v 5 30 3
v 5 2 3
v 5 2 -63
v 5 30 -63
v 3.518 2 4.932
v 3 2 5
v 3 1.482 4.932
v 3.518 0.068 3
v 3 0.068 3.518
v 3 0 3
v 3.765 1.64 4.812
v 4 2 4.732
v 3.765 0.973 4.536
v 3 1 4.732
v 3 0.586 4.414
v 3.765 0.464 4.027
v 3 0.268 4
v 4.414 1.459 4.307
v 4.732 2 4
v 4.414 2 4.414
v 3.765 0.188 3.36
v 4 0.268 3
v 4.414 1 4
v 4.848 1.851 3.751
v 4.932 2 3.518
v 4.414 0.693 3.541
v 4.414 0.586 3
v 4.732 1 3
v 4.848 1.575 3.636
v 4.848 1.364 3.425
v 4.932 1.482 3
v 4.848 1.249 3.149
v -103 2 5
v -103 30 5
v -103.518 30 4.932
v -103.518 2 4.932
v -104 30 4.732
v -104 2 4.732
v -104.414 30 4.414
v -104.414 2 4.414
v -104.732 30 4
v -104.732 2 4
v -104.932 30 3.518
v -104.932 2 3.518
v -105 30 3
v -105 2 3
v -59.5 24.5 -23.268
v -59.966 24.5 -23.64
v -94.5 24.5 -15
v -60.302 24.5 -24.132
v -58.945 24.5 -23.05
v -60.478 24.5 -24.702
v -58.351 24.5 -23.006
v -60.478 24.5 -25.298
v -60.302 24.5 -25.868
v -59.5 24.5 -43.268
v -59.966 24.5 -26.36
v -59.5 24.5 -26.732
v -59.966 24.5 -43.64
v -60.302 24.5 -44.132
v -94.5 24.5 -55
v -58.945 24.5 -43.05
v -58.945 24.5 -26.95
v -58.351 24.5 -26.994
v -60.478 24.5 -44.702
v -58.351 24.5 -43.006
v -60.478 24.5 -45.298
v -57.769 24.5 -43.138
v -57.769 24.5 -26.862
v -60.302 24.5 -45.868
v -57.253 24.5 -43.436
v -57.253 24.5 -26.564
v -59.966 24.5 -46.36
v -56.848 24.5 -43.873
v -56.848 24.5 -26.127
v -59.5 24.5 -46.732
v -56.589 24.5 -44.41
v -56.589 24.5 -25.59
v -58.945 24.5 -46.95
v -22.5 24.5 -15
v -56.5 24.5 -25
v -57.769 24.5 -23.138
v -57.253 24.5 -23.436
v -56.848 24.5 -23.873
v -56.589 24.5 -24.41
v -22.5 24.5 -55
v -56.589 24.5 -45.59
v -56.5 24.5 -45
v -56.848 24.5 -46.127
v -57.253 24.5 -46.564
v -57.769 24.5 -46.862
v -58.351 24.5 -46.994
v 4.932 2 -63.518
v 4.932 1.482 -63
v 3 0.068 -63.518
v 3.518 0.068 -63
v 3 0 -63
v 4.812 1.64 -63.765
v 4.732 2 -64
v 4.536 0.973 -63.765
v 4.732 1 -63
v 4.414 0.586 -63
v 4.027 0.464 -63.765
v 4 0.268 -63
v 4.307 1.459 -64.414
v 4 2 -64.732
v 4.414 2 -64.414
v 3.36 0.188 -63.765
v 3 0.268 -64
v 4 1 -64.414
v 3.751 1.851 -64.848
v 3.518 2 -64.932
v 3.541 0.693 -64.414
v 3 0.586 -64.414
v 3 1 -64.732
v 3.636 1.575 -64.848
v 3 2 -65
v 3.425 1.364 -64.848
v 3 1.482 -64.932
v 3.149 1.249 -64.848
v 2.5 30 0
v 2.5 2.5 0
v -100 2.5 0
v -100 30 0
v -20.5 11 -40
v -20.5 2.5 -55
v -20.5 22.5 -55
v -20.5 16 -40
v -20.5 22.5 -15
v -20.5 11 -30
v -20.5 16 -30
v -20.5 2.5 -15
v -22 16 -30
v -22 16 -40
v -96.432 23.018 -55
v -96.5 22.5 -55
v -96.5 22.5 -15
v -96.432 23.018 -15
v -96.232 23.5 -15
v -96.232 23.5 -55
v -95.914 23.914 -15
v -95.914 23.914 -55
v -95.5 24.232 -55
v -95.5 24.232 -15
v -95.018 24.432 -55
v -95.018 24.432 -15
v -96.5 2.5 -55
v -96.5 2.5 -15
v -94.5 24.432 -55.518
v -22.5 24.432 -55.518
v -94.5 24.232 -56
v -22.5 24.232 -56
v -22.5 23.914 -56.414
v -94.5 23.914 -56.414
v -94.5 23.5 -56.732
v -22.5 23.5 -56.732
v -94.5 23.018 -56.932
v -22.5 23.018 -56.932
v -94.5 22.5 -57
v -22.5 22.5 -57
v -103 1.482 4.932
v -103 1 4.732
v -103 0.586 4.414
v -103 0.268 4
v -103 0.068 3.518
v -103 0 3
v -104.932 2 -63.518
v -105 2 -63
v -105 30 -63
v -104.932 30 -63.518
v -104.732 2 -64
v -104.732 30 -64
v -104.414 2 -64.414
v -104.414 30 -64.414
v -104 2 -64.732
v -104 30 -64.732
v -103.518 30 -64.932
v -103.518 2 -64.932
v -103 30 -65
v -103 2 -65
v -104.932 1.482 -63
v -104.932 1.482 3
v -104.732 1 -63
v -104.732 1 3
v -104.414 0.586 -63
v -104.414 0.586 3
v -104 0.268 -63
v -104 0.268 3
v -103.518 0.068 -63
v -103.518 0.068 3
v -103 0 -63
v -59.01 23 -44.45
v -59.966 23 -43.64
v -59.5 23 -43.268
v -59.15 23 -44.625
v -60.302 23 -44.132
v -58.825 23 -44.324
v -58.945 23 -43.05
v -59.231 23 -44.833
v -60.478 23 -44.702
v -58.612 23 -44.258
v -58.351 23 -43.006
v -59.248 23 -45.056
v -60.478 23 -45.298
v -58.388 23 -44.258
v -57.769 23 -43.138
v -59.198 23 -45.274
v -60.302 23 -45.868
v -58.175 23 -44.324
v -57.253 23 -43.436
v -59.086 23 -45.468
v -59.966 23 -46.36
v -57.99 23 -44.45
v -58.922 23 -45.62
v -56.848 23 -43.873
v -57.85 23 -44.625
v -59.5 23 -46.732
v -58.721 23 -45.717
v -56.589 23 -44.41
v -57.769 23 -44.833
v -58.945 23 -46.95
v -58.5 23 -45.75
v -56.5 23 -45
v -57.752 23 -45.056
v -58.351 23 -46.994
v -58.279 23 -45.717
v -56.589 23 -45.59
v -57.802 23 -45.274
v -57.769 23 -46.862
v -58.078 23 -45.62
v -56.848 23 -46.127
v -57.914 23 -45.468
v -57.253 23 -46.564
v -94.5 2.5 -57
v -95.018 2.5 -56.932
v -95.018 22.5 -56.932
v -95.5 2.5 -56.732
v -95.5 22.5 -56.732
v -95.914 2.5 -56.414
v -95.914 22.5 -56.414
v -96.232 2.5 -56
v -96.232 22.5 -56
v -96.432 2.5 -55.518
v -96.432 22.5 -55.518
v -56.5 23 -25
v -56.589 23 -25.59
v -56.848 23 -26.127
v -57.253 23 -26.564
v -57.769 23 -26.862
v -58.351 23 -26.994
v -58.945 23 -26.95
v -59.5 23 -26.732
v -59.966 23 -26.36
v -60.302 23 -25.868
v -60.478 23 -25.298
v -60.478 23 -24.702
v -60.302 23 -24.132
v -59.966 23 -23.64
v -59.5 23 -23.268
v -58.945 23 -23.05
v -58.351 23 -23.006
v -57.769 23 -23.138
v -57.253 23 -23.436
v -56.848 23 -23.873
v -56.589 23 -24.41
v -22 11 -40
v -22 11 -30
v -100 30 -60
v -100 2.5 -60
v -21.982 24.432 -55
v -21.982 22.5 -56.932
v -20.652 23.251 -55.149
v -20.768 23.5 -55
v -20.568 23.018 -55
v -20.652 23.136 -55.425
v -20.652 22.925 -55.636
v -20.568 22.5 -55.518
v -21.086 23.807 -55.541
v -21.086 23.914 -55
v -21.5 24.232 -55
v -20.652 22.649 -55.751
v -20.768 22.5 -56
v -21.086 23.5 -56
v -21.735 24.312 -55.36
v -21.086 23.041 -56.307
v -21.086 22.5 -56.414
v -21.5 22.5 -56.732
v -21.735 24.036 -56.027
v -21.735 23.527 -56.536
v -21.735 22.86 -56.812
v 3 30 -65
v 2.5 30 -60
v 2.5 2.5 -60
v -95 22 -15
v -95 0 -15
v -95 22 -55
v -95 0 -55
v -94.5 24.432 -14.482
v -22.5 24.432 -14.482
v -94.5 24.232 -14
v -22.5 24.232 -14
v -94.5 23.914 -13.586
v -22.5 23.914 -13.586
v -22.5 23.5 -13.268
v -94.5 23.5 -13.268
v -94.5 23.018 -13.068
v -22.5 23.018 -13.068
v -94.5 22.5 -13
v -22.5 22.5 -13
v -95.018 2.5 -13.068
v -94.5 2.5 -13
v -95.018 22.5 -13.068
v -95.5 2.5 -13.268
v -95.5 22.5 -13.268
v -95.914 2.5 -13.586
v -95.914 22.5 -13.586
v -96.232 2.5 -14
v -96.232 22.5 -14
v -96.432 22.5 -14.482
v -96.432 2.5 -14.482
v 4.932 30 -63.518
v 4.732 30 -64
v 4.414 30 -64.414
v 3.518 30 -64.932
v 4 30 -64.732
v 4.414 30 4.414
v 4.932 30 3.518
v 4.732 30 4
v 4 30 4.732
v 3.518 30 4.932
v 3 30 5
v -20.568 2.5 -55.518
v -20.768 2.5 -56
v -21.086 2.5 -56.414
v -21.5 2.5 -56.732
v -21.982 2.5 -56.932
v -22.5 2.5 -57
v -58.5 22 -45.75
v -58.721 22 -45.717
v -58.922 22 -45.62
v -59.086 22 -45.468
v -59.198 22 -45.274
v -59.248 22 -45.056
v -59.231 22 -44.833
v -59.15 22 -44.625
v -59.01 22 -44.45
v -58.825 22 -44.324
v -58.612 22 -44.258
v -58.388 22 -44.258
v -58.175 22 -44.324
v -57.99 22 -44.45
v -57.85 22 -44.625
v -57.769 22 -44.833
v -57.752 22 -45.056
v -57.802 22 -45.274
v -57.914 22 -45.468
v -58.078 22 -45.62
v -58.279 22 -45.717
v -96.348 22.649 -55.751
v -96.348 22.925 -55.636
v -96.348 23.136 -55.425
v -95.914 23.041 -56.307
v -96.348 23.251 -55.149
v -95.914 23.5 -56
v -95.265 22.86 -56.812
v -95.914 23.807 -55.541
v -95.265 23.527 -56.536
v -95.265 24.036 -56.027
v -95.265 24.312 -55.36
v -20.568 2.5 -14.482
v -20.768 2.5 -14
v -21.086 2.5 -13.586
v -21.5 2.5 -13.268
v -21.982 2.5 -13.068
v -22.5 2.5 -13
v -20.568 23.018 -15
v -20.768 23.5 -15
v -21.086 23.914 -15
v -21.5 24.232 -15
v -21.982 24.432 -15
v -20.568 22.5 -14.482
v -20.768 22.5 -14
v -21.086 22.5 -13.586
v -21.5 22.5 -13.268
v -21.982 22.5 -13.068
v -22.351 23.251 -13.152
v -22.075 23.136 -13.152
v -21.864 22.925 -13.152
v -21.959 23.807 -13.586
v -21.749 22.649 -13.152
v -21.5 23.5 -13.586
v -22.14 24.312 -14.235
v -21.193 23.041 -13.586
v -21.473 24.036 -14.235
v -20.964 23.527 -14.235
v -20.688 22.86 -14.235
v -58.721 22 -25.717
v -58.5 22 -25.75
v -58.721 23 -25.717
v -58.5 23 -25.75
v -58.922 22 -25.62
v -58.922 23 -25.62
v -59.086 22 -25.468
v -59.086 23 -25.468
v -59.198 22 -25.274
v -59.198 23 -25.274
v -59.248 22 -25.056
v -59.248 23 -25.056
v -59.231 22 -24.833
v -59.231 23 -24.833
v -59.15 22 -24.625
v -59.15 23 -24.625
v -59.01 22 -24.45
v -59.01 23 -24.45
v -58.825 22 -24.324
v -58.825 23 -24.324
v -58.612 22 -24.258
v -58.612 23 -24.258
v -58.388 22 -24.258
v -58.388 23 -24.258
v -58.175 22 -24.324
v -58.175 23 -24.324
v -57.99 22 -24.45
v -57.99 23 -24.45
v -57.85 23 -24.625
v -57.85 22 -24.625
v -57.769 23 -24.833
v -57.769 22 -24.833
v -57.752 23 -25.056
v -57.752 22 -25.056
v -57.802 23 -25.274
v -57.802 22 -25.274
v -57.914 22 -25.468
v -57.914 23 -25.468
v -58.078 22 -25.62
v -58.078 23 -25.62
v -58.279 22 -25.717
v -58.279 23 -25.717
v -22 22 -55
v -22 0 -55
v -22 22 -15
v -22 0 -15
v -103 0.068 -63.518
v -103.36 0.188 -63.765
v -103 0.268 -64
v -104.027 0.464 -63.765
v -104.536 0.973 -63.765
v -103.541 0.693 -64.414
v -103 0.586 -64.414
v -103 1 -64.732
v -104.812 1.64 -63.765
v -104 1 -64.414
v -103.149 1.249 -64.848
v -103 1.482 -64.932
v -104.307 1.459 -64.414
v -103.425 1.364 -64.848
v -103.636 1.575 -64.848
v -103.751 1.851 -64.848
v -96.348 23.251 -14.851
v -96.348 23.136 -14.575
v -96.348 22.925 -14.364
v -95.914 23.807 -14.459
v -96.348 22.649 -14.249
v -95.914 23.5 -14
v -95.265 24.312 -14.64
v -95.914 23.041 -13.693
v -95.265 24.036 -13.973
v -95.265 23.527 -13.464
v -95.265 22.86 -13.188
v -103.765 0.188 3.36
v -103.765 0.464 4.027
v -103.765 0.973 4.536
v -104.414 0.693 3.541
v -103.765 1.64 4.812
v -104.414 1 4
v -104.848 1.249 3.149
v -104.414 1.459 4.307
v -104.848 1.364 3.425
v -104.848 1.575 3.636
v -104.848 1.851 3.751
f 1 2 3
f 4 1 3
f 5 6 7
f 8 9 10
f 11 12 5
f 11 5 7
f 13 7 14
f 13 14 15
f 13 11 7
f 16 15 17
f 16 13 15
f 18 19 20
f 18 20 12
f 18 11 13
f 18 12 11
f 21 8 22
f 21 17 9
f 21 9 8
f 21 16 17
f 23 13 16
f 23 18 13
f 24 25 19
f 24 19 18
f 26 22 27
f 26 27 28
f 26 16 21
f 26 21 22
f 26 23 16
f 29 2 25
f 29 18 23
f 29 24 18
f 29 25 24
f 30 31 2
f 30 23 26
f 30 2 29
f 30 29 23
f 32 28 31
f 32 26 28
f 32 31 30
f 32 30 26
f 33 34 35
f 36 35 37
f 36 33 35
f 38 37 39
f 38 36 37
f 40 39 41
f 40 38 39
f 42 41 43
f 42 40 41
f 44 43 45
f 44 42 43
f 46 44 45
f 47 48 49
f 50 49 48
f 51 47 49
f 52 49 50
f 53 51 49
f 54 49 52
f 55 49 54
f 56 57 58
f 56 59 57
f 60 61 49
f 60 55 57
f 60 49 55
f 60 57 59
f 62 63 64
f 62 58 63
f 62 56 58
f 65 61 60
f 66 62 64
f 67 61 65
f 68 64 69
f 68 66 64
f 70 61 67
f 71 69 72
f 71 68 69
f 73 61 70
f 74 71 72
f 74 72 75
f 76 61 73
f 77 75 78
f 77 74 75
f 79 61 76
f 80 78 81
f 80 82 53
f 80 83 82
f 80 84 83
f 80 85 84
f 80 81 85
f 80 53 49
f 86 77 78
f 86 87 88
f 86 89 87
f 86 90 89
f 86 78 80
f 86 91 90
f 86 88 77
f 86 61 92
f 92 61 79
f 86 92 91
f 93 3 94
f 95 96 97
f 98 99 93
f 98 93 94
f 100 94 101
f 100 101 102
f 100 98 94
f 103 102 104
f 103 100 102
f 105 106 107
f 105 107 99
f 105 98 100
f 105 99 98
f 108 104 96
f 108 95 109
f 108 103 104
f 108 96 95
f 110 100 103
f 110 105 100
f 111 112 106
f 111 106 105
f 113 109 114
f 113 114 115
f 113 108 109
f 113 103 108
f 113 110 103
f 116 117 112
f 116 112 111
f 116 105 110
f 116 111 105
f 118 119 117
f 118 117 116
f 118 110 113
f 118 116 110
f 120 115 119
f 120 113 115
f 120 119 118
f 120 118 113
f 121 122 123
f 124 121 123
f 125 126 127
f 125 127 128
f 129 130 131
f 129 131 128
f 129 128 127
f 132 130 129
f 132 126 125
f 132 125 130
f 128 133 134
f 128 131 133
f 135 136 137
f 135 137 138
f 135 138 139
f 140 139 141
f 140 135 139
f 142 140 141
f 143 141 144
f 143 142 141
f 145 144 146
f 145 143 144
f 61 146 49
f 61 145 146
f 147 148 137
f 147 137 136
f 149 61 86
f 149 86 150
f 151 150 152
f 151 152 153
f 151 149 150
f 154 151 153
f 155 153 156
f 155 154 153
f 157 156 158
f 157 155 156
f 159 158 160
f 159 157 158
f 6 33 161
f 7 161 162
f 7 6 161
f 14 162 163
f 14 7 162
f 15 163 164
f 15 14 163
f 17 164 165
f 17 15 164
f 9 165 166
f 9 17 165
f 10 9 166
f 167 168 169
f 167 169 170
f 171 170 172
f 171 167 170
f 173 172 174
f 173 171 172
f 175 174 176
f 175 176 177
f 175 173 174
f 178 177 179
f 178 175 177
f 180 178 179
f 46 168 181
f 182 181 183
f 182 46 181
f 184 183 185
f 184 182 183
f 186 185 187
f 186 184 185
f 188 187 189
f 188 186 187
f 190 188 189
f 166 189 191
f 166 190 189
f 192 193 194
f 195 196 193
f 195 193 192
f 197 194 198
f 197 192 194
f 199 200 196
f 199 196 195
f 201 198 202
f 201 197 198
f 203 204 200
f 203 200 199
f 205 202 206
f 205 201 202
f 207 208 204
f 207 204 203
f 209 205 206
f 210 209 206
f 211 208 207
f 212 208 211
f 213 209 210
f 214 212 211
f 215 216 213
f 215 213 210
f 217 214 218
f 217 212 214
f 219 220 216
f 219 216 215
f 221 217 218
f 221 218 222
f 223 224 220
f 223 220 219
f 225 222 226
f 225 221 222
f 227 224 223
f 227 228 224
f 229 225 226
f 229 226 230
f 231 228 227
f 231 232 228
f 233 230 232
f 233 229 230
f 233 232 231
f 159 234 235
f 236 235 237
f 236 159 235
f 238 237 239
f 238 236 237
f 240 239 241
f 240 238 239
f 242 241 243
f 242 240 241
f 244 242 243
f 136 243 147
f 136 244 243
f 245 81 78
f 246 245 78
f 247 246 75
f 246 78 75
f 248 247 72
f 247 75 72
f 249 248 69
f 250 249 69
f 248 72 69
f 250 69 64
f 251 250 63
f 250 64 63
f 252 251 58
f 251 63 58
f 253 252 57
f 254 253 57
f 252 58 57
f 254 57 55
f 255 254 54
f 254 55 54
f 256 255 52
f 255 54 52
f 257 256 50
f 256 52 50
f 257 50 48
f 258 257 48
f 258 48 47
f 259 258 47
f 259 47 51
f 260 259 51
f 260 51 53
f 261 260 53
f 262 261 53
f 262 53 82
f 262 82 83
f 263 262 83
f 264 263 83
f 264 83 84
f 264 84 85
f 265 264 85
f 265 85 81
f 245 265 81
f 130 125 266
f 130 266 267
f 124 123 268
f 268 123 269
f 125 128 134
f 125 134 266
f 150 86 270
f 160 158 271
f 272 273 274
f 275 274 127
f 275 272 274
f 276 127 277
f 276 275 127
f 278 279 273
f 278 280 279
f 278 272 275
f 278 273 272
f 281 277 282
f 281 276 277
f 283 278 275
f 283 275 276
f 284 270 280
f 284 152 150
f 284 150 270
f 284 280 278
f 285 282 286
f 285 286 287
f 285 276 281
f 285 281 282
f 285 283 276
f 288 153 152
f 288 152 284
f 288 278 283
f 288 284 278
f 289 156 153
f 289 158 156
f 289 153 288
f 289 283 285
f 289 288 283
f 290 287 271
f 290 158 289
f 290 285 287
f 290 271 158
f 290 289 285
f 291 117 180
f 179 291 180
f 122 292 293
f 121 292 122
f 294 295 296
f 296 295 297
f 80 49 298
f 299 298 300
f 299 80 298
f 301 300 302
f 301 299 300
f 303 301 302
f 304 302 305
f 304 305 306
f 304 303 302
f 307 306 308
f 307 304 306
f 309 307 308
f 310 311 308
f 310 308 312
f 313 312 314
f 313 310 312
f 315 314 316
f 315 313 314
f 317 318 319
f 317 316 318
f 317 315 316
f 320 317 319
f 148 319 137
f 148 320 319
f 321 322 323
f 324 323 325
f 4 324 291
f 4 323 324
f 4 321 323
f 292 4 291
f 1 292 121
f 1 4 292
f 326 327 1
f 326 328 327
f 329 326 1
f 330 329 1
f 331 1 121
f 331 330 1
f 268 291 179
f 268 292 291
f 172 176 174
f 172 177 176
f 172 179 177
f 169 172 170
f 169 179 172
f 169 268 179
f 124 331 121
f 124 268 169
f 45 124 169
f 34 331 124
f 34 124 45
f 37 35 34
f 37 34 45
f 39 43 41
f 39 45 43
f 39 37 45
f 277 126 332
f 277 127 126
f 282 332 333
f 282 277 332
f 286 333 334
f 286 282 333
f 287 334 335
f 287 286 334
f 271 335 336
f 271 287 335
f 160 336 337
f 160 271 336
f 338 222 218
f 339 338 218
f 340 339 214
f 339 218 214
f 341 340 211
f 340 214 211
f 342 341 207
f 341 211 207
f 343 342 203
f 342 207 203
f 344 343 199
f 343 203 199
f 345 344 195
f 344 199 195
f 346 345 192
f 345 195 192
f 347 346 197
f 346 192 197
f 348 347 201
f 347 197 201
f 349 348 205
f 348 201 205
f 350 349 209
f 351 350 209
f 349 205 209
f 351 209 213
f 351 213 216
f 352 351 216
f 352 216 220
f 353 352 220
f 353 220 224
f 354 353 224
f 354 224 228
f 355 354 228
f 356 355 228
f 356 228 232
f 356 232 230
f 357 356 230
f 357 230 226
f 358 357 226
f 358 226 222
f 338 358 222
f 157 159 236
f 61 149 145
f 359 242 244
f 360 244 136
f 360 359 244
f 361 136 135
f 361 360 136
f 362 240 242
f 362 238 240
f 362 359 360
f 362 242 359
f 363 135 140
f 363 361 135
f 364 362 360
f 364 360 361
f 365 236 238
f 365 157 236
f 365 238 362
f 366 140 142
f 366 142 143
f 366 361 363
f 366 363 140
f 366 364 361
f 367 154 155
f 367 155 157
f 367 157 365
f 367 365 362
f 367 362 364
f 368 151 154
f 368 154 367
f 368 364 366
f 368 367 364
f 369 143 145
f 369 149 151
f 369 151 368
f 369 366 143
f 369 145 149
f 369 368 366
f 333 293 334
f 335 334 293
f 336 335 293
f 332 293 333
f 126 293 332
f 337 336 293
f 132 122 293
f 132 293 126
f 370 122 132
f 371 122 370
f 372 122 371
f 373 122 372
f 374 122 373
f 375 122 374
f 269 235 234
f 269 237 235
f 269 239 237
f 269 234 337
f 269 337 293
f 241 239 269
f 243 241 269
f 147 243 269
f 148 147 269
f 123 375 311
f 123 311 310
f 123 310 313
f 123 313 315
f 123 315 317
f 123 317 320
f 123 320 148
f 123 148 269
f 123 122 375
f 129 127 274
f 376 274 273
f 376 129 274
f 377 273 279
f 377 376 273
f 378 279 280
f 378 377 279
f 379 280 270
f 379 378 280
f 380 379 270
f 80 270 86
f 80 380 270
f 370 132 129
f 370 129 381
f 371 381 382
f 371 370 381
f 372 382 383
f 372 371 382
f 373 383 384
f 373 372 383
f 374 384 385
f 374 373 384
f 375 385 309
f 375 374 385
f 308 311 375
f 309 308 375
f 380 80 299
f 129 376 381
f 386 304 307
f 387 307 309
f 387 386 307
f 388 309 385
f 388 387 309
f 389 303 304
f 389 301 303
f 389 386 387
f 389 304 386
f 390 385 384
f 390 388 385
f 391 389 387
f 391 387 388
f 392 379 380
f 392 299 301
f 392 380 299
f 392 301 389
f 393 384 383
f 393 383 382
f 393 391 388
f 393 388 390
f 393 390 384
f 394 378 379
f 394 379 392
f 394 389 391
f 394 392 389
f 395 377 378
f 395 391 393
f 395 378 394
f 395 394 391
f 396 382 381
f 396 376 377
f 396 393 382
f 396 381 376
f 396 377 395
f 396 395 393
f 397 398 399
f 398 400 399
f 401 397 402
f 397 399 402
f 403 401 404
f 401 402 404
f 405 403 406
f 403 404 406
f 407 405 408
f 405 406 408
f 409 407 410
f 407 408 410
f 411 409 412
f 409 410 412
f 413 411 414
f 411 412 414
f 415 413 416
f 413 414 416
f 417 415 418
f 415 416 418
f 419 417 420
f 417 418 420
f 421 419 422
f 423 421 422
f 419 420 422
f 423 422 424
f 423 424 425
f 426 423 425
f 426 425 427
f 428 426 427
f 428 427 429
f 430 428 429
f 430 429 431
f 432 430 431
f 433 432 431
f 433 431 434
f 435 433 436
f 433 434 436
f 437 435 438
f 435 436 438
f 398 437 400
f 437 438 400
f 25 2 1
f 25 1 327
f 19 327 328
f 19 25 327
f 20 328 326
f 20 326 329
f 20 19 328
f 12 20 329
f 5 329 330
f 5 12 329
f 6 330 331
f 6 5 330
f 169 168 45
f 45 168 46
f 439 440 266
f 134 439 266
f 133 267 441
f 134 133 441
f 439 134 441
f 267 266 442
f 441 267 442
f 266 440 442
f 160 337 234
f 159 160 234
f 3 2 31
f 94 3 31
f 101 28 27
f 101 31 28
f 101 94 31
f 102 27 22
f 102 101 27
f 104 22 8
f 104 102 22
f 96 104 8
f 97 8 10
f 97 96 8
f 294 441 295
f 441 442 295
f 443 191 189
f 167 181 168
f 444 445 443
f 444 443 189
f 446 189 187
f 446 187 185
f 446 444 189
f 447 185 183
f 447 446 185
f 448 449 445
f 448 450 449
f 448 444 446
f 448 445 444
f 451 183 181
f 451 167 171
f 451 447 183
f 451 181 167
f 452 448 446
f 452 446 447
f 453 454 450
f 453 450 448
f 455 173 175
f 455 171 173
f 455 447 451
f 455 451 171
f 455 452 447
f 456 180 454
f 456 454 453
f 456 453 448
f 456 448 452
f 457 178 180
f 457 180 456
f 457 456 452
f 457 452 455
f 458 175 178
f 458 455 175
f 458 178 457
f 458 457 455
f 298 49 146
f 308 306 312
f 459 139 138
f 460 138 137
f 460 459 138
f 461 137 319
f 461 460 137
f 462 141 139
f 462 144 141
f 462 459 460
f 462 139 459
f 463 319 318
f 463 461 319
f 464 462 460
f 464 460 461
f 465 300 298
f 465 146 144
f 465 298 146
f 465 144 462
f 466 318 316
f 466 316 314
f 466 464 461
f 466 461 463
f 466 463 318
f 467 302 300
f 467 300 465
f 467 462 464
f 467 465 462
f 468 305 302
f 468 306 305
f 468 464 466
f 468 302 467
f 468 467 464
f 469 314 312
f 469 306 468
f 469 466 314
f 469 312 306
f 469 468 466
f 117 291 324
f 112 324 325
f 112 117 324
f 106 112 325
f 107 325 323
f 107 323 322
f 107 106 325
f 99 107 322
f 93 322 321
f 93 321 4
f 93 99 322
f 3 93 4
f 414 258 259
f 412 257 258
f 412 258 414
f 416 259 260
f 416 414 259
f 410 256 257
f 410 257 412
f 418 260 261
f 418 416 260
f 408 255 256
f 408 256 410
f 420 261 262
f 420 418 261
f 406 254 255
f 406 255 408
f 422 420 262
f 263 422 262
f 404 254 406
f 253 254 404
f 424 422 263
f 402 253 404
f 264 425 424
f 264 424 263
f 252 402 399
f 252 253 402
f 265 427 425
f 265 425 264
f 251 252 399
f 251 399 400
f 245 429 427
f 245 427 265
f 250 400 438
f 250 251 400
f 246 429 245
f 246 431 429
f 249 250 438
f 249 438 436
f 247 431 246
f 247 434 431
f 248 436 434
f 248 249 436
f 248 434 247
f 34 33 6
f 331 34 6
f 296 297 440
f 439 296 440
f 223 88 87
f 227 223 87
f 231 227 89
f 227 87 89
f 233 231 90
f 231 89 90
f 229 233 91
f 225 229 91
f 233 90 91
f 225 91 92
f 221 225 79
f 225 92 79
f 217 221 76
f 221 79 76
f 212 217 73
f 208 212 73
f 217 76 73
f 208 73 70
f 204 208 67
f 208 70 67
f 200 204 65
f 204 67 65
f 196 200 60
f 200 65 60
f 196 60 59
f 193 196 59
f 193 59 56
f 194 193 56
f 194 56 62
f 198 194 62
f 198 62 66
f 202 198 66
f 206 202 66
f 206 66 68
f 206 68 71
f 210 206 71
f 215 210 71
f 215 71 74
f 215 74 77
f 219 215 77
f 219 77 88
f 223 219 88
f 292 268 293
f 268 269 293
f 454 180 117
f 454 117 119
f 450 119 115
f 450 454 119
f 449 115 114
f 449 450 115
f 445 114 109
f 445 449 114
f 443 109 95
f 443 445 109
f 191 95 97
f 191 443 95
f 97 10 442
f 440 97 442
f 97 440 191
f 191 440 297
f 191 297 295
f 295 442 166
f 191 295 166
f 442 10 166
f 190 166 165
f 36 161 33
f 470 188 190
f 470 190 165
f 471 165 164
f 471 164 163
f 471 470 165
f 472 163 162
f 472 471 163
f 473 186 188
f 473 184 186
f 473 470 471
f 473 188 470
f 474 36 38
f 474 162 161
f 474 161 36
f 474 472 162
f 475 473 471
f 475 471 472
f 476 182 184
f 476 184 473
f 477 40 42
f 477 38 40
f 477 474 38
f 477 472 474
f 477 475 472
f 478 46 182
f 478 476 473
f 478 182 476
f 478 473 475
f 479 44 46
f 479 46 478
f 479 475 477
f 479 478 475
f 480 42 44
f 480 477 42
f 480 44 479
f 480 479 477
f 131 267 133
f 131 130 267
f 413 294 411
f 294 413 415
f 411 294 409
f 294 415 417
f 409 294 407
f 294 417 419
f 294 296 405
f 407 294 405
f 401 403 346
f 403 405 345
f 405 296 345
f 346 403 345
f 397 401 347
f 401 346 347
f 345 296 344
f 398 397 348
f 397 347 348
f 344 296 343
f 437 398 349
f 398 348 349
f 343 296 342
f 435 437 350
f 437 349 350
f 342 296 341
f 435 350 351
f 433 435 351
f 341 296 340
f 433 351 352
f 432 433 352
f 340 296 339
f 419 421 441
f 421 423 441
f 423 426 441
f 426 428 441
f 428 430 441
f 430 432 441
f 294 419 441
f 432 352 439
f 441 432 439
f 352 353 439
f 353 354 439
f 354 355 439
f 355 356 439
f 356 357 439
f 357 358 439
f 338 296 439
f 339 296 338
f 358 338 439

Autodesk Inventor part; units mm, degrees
ref_plane "YZ Plane" through (0, 0, 0) normal (1, 0, 0) x (0, 1, 0)
ref_plane "XZ Plane" through (0, 0, 0) normal (0, 1, 0) x (-1, 0, 0)
ref_plane "XY Plane" through (0, 0, 0) normal (0, 0, 1) x (1, 0, 0)
sketch "Sketch1" plane through (0, 0, 0) normal (0, 1, 0) x (-1, 0, 0)
  line L0 (0, 0) -> (100, 0)
  line L1 (100, 0) -> (100, -60)
  line L2 (100, -60) -> (0, -60)
  line L3 (0, -60) -> (0, 0)
  line L4 (100, -52.4106) -> (95, -52.4106) construction
  line L5 (100, -52.4106) -> (105, -52.4106) construction
  line L6 (95, -60) -> (95, -55)
  line L7 (95, -55) -> (22, -55)
  line L8 (22, -55) -> (22, -15)
  line L9 (22, -15) -> (95, -15)
  line L10 (95, -15) -> (95, -55)
  line L11 (100, 0) -> (0, -60) construction
  line L12 (100, -60) -> (0, 0) construction
  line L13 (-5, -65) -> (105, -65)
  line L14 (105, -65) -> (105, 5)
  line L15 (105, 5) -> (-5, 5)
  line L16 (-5, 5) -> (-5, -65)
  line L17 (-5, -65) -> (105, 5) construction
  line L18 (105, -65) -> (-5, 5) construction
  line L19 (95, -15) -> (22, -55) construction
  line L20 (95, -55) -> (22, -15) construction
  line L21 (20.5, -13) -> (96.5, -13)
  line L22 (96.5, -13) -> (96.5, -57)
  line L23 (96.5, -57) -> (20.5, -57)
  line L24 (20.5, -57) -> (20.5, -13)
  line L25 (20.5, -13) -> (96.5, -57) construction
  line L26 (96.5, -13) -> (20.5, -57) construction
  point P0 (50, -30)
  point P1 (58.5, -35)
  dimension "d0" = 100
  dimension "d1" = 60
  dimension "d2" = 5
  dimension "d3" = 180
  dimension "d4" = 5
  dimension "d5" = 73
  dimension "d6" = 40
  dimension "d7" = 110
  dimension "d8" = 70
  dimension "d9" = 76
  dimension "d10" = 44
extrude "Extrusion1" add sketch "Sketch1" along normal blind 30 contours L16 L15 L14 L13
extrude "Extrusion2" add sketch "Sketch1" along normal blind 22 contours L21 L22 L23 L24
extrude "Extrusion3" add sketch "Sketch1" along normal blind 2.5 contours L0 L1 L2 L3
sketch "Sketch2" plane through (0, 22, 0) normal (0, 1, 0) x (1, 0, 0)
  line L0 (-20.5, 57) -> (-96.5, 57) projected
  line L1 (-96.5, 13) -> (-20.5, 13) projected
  line L2 (-96.5, 57) -> (-20.5, 57)
  line L3 (-20.5, 57) -> (-20.5, 13)
  line L4 (-20.5, 13) -> (-96.5, 13)
  line L5 (-96.5, 13) -> (-96.5, 57)
  point P0 (0, 0)
extrude "Extrusion4" add sketch "Sketch2" along normal blind 2.5
sketch "Sketch4" plane through (-20.5, 2.5, -13) normal (1, 0, 0) x (0, 0, -1)
  line L0 (-18, -2.5) -> (-18, 27.5) projected
  line L1 (-18, 27.5) -> (-13, 27.5) projected
  line L2 (-13, 27.5) -> (-13, 0) projected
  line L3 (-13, 0) -> (0, 0) projected
  line L4 (0, 0) -> (44, 0) projected
  line L5 (44, 0) -> (47, 0) projected
  line L6 (47, 0) -> (47, 27.5) projected
  line L7 (47, 27.5) -> (52, 27.5) projected
  line L8 (52, 27.5) -> (52, -2.5) projected
  line L9 (52, -2.5) -> (-18, -2.5) projected
  line L10 (0, 0) -> (0, 22) projected
  line L11 (0, 22) -> (44, 22) projected
  line L12 (44, 22) -> (44, 0) projected
  line L13 (0, 22) -> (44, 22) projected
  line L14 (44, 22) -> (0, 22) projected
  line L15 (-18, -2.5) -> (52, -2.5) projected
  line L16 (52, -2.5) -> (52, 27.5) projected
  line L17 (-18, 27.5) -> (52, 27.5) projected
  line L18 (-18, -2.5) -> (-18, 27.5) projected
  line L19 (0, 0) -> (44, 0) projected
  line L20 (44, 0) -> (44, 22) projected
  line L21 (0, 22) -> (44, 22) projected
  line L22 (0, 0) -> (0, 22) projected
  line L23 (44, 0) -> (44, 22) construction
  line L24 (44, 22) -> (0, 0) construction
  line L25 (44, 0) -> (0, 0) construction
  line L26 (44, 22) -> (0, 22) construction
  line L27 (44, 0) -> (0, 22) construction
  line L28 (27, 8.5) -> (17, 8.5)
  line L29 (17, 8.5) -> (17, 13.5)
  line L30 (17, 13.5) -> (27, 13.5)
  line L31 (27, 13.5) -> (27, 8.5)
  line L32 (27, 8.5) -> (17, 13.5) construction
  line L33 (17, 8.5) -> (27, 13.5) construction
  point P0 (-13, -2.5)
  point P1 (22, 11)
  dimension "d19" = 10
  dimension "d20" = 5
extrude "Extrusion5" cut sketch "Sketch4" against normal blind 10 contours L28 L29 L30 L31
fillet "Fillet1" radius 2 8 edges at (-58.5, 24.5, -57) (-20.5, 24.5, -35) (-58.5, 24.5, -13) (-96.5, 24.5, -35) (-20.5, 13.5, -13) (-20.5, 13.5, -57) (-96.5, 13.5, -13) (-96.5, 13.5, -57)
sketch "Sketch5" plane through (0, 22, 0) normal (0, -1, 0) x (1, 0, 0)
  line L0 (-22, -55) -> (-22, -15) construction
  line L1 (-94.5, -55) -> (-96.5, -55) construction
  line L2 (-58.5, -35) -> (-58.5, -55) construction
  line L3 (-58.5, -55) -> (-58.5, -45) construction
  line L4 (-58.5, -15) -> (-58.5, -25) construction
  point P0 (0, 0)
  dimension "d24" = 10
  dimension "d25" = 10
hole "Hole1" at (-58.5, 22, -45) at (-58.5, 22, -25) direction (0, 1, 0) diameter 1.5 depth 40 tip angle 118
sketch "Sketch6" plane through (0, 24.5, 0) normal (0, 1, 0) x (1, 0, 0)
  circle A0 centre (-58.5, 45) radius 0.75 projected
  circle A1 centre (-58.5, 45) radius 2
  circle A2 centre (-58.5, 25) radius 0.75 projected
  circle A3 centre (-58.5, 25) radius 2
  point P0 (0, 0)
  dimension "d33" = 4
  dimension "d34" = 4
extrude "Extrusion6" cut sketch "Sketch6" against normal blind 1.5
fillet "Fillet2" radius 2 4 edges at (-50, 0, -65) (-105, 0, -30) (-50, 0, 5) (5, 0, -30)
sketch "Sketch7" plane through (0, 30, 0) normal (0, 1, 0) x (1, 0, 0)
  line L0 (0, 60) -> (2.5, 60)
  line L1 (2.5, 60) -> (2.5, 0)
  line L2 (2.5, 0) -> (0, 0)
  line L3 (0, 0) -> (0, 60)
  dimension "d46" = 2.5
extrude "Extrusion7" cut sketch "Sketch7" against normal blind 27.5
fillet "Fillet3" radius 2 8 edges at (-104.4142, 0.5858, 4.4142) (-105, 16, 5) (4.4142, 0.5858, 4.4142) (5, 16, 5) (-104.4142, 0.5858, -64.4142) (-105, 16, -65) (4.4142, 0.5858, -64.4142) (5, 16, -65)
properties part number "abajo model2"
